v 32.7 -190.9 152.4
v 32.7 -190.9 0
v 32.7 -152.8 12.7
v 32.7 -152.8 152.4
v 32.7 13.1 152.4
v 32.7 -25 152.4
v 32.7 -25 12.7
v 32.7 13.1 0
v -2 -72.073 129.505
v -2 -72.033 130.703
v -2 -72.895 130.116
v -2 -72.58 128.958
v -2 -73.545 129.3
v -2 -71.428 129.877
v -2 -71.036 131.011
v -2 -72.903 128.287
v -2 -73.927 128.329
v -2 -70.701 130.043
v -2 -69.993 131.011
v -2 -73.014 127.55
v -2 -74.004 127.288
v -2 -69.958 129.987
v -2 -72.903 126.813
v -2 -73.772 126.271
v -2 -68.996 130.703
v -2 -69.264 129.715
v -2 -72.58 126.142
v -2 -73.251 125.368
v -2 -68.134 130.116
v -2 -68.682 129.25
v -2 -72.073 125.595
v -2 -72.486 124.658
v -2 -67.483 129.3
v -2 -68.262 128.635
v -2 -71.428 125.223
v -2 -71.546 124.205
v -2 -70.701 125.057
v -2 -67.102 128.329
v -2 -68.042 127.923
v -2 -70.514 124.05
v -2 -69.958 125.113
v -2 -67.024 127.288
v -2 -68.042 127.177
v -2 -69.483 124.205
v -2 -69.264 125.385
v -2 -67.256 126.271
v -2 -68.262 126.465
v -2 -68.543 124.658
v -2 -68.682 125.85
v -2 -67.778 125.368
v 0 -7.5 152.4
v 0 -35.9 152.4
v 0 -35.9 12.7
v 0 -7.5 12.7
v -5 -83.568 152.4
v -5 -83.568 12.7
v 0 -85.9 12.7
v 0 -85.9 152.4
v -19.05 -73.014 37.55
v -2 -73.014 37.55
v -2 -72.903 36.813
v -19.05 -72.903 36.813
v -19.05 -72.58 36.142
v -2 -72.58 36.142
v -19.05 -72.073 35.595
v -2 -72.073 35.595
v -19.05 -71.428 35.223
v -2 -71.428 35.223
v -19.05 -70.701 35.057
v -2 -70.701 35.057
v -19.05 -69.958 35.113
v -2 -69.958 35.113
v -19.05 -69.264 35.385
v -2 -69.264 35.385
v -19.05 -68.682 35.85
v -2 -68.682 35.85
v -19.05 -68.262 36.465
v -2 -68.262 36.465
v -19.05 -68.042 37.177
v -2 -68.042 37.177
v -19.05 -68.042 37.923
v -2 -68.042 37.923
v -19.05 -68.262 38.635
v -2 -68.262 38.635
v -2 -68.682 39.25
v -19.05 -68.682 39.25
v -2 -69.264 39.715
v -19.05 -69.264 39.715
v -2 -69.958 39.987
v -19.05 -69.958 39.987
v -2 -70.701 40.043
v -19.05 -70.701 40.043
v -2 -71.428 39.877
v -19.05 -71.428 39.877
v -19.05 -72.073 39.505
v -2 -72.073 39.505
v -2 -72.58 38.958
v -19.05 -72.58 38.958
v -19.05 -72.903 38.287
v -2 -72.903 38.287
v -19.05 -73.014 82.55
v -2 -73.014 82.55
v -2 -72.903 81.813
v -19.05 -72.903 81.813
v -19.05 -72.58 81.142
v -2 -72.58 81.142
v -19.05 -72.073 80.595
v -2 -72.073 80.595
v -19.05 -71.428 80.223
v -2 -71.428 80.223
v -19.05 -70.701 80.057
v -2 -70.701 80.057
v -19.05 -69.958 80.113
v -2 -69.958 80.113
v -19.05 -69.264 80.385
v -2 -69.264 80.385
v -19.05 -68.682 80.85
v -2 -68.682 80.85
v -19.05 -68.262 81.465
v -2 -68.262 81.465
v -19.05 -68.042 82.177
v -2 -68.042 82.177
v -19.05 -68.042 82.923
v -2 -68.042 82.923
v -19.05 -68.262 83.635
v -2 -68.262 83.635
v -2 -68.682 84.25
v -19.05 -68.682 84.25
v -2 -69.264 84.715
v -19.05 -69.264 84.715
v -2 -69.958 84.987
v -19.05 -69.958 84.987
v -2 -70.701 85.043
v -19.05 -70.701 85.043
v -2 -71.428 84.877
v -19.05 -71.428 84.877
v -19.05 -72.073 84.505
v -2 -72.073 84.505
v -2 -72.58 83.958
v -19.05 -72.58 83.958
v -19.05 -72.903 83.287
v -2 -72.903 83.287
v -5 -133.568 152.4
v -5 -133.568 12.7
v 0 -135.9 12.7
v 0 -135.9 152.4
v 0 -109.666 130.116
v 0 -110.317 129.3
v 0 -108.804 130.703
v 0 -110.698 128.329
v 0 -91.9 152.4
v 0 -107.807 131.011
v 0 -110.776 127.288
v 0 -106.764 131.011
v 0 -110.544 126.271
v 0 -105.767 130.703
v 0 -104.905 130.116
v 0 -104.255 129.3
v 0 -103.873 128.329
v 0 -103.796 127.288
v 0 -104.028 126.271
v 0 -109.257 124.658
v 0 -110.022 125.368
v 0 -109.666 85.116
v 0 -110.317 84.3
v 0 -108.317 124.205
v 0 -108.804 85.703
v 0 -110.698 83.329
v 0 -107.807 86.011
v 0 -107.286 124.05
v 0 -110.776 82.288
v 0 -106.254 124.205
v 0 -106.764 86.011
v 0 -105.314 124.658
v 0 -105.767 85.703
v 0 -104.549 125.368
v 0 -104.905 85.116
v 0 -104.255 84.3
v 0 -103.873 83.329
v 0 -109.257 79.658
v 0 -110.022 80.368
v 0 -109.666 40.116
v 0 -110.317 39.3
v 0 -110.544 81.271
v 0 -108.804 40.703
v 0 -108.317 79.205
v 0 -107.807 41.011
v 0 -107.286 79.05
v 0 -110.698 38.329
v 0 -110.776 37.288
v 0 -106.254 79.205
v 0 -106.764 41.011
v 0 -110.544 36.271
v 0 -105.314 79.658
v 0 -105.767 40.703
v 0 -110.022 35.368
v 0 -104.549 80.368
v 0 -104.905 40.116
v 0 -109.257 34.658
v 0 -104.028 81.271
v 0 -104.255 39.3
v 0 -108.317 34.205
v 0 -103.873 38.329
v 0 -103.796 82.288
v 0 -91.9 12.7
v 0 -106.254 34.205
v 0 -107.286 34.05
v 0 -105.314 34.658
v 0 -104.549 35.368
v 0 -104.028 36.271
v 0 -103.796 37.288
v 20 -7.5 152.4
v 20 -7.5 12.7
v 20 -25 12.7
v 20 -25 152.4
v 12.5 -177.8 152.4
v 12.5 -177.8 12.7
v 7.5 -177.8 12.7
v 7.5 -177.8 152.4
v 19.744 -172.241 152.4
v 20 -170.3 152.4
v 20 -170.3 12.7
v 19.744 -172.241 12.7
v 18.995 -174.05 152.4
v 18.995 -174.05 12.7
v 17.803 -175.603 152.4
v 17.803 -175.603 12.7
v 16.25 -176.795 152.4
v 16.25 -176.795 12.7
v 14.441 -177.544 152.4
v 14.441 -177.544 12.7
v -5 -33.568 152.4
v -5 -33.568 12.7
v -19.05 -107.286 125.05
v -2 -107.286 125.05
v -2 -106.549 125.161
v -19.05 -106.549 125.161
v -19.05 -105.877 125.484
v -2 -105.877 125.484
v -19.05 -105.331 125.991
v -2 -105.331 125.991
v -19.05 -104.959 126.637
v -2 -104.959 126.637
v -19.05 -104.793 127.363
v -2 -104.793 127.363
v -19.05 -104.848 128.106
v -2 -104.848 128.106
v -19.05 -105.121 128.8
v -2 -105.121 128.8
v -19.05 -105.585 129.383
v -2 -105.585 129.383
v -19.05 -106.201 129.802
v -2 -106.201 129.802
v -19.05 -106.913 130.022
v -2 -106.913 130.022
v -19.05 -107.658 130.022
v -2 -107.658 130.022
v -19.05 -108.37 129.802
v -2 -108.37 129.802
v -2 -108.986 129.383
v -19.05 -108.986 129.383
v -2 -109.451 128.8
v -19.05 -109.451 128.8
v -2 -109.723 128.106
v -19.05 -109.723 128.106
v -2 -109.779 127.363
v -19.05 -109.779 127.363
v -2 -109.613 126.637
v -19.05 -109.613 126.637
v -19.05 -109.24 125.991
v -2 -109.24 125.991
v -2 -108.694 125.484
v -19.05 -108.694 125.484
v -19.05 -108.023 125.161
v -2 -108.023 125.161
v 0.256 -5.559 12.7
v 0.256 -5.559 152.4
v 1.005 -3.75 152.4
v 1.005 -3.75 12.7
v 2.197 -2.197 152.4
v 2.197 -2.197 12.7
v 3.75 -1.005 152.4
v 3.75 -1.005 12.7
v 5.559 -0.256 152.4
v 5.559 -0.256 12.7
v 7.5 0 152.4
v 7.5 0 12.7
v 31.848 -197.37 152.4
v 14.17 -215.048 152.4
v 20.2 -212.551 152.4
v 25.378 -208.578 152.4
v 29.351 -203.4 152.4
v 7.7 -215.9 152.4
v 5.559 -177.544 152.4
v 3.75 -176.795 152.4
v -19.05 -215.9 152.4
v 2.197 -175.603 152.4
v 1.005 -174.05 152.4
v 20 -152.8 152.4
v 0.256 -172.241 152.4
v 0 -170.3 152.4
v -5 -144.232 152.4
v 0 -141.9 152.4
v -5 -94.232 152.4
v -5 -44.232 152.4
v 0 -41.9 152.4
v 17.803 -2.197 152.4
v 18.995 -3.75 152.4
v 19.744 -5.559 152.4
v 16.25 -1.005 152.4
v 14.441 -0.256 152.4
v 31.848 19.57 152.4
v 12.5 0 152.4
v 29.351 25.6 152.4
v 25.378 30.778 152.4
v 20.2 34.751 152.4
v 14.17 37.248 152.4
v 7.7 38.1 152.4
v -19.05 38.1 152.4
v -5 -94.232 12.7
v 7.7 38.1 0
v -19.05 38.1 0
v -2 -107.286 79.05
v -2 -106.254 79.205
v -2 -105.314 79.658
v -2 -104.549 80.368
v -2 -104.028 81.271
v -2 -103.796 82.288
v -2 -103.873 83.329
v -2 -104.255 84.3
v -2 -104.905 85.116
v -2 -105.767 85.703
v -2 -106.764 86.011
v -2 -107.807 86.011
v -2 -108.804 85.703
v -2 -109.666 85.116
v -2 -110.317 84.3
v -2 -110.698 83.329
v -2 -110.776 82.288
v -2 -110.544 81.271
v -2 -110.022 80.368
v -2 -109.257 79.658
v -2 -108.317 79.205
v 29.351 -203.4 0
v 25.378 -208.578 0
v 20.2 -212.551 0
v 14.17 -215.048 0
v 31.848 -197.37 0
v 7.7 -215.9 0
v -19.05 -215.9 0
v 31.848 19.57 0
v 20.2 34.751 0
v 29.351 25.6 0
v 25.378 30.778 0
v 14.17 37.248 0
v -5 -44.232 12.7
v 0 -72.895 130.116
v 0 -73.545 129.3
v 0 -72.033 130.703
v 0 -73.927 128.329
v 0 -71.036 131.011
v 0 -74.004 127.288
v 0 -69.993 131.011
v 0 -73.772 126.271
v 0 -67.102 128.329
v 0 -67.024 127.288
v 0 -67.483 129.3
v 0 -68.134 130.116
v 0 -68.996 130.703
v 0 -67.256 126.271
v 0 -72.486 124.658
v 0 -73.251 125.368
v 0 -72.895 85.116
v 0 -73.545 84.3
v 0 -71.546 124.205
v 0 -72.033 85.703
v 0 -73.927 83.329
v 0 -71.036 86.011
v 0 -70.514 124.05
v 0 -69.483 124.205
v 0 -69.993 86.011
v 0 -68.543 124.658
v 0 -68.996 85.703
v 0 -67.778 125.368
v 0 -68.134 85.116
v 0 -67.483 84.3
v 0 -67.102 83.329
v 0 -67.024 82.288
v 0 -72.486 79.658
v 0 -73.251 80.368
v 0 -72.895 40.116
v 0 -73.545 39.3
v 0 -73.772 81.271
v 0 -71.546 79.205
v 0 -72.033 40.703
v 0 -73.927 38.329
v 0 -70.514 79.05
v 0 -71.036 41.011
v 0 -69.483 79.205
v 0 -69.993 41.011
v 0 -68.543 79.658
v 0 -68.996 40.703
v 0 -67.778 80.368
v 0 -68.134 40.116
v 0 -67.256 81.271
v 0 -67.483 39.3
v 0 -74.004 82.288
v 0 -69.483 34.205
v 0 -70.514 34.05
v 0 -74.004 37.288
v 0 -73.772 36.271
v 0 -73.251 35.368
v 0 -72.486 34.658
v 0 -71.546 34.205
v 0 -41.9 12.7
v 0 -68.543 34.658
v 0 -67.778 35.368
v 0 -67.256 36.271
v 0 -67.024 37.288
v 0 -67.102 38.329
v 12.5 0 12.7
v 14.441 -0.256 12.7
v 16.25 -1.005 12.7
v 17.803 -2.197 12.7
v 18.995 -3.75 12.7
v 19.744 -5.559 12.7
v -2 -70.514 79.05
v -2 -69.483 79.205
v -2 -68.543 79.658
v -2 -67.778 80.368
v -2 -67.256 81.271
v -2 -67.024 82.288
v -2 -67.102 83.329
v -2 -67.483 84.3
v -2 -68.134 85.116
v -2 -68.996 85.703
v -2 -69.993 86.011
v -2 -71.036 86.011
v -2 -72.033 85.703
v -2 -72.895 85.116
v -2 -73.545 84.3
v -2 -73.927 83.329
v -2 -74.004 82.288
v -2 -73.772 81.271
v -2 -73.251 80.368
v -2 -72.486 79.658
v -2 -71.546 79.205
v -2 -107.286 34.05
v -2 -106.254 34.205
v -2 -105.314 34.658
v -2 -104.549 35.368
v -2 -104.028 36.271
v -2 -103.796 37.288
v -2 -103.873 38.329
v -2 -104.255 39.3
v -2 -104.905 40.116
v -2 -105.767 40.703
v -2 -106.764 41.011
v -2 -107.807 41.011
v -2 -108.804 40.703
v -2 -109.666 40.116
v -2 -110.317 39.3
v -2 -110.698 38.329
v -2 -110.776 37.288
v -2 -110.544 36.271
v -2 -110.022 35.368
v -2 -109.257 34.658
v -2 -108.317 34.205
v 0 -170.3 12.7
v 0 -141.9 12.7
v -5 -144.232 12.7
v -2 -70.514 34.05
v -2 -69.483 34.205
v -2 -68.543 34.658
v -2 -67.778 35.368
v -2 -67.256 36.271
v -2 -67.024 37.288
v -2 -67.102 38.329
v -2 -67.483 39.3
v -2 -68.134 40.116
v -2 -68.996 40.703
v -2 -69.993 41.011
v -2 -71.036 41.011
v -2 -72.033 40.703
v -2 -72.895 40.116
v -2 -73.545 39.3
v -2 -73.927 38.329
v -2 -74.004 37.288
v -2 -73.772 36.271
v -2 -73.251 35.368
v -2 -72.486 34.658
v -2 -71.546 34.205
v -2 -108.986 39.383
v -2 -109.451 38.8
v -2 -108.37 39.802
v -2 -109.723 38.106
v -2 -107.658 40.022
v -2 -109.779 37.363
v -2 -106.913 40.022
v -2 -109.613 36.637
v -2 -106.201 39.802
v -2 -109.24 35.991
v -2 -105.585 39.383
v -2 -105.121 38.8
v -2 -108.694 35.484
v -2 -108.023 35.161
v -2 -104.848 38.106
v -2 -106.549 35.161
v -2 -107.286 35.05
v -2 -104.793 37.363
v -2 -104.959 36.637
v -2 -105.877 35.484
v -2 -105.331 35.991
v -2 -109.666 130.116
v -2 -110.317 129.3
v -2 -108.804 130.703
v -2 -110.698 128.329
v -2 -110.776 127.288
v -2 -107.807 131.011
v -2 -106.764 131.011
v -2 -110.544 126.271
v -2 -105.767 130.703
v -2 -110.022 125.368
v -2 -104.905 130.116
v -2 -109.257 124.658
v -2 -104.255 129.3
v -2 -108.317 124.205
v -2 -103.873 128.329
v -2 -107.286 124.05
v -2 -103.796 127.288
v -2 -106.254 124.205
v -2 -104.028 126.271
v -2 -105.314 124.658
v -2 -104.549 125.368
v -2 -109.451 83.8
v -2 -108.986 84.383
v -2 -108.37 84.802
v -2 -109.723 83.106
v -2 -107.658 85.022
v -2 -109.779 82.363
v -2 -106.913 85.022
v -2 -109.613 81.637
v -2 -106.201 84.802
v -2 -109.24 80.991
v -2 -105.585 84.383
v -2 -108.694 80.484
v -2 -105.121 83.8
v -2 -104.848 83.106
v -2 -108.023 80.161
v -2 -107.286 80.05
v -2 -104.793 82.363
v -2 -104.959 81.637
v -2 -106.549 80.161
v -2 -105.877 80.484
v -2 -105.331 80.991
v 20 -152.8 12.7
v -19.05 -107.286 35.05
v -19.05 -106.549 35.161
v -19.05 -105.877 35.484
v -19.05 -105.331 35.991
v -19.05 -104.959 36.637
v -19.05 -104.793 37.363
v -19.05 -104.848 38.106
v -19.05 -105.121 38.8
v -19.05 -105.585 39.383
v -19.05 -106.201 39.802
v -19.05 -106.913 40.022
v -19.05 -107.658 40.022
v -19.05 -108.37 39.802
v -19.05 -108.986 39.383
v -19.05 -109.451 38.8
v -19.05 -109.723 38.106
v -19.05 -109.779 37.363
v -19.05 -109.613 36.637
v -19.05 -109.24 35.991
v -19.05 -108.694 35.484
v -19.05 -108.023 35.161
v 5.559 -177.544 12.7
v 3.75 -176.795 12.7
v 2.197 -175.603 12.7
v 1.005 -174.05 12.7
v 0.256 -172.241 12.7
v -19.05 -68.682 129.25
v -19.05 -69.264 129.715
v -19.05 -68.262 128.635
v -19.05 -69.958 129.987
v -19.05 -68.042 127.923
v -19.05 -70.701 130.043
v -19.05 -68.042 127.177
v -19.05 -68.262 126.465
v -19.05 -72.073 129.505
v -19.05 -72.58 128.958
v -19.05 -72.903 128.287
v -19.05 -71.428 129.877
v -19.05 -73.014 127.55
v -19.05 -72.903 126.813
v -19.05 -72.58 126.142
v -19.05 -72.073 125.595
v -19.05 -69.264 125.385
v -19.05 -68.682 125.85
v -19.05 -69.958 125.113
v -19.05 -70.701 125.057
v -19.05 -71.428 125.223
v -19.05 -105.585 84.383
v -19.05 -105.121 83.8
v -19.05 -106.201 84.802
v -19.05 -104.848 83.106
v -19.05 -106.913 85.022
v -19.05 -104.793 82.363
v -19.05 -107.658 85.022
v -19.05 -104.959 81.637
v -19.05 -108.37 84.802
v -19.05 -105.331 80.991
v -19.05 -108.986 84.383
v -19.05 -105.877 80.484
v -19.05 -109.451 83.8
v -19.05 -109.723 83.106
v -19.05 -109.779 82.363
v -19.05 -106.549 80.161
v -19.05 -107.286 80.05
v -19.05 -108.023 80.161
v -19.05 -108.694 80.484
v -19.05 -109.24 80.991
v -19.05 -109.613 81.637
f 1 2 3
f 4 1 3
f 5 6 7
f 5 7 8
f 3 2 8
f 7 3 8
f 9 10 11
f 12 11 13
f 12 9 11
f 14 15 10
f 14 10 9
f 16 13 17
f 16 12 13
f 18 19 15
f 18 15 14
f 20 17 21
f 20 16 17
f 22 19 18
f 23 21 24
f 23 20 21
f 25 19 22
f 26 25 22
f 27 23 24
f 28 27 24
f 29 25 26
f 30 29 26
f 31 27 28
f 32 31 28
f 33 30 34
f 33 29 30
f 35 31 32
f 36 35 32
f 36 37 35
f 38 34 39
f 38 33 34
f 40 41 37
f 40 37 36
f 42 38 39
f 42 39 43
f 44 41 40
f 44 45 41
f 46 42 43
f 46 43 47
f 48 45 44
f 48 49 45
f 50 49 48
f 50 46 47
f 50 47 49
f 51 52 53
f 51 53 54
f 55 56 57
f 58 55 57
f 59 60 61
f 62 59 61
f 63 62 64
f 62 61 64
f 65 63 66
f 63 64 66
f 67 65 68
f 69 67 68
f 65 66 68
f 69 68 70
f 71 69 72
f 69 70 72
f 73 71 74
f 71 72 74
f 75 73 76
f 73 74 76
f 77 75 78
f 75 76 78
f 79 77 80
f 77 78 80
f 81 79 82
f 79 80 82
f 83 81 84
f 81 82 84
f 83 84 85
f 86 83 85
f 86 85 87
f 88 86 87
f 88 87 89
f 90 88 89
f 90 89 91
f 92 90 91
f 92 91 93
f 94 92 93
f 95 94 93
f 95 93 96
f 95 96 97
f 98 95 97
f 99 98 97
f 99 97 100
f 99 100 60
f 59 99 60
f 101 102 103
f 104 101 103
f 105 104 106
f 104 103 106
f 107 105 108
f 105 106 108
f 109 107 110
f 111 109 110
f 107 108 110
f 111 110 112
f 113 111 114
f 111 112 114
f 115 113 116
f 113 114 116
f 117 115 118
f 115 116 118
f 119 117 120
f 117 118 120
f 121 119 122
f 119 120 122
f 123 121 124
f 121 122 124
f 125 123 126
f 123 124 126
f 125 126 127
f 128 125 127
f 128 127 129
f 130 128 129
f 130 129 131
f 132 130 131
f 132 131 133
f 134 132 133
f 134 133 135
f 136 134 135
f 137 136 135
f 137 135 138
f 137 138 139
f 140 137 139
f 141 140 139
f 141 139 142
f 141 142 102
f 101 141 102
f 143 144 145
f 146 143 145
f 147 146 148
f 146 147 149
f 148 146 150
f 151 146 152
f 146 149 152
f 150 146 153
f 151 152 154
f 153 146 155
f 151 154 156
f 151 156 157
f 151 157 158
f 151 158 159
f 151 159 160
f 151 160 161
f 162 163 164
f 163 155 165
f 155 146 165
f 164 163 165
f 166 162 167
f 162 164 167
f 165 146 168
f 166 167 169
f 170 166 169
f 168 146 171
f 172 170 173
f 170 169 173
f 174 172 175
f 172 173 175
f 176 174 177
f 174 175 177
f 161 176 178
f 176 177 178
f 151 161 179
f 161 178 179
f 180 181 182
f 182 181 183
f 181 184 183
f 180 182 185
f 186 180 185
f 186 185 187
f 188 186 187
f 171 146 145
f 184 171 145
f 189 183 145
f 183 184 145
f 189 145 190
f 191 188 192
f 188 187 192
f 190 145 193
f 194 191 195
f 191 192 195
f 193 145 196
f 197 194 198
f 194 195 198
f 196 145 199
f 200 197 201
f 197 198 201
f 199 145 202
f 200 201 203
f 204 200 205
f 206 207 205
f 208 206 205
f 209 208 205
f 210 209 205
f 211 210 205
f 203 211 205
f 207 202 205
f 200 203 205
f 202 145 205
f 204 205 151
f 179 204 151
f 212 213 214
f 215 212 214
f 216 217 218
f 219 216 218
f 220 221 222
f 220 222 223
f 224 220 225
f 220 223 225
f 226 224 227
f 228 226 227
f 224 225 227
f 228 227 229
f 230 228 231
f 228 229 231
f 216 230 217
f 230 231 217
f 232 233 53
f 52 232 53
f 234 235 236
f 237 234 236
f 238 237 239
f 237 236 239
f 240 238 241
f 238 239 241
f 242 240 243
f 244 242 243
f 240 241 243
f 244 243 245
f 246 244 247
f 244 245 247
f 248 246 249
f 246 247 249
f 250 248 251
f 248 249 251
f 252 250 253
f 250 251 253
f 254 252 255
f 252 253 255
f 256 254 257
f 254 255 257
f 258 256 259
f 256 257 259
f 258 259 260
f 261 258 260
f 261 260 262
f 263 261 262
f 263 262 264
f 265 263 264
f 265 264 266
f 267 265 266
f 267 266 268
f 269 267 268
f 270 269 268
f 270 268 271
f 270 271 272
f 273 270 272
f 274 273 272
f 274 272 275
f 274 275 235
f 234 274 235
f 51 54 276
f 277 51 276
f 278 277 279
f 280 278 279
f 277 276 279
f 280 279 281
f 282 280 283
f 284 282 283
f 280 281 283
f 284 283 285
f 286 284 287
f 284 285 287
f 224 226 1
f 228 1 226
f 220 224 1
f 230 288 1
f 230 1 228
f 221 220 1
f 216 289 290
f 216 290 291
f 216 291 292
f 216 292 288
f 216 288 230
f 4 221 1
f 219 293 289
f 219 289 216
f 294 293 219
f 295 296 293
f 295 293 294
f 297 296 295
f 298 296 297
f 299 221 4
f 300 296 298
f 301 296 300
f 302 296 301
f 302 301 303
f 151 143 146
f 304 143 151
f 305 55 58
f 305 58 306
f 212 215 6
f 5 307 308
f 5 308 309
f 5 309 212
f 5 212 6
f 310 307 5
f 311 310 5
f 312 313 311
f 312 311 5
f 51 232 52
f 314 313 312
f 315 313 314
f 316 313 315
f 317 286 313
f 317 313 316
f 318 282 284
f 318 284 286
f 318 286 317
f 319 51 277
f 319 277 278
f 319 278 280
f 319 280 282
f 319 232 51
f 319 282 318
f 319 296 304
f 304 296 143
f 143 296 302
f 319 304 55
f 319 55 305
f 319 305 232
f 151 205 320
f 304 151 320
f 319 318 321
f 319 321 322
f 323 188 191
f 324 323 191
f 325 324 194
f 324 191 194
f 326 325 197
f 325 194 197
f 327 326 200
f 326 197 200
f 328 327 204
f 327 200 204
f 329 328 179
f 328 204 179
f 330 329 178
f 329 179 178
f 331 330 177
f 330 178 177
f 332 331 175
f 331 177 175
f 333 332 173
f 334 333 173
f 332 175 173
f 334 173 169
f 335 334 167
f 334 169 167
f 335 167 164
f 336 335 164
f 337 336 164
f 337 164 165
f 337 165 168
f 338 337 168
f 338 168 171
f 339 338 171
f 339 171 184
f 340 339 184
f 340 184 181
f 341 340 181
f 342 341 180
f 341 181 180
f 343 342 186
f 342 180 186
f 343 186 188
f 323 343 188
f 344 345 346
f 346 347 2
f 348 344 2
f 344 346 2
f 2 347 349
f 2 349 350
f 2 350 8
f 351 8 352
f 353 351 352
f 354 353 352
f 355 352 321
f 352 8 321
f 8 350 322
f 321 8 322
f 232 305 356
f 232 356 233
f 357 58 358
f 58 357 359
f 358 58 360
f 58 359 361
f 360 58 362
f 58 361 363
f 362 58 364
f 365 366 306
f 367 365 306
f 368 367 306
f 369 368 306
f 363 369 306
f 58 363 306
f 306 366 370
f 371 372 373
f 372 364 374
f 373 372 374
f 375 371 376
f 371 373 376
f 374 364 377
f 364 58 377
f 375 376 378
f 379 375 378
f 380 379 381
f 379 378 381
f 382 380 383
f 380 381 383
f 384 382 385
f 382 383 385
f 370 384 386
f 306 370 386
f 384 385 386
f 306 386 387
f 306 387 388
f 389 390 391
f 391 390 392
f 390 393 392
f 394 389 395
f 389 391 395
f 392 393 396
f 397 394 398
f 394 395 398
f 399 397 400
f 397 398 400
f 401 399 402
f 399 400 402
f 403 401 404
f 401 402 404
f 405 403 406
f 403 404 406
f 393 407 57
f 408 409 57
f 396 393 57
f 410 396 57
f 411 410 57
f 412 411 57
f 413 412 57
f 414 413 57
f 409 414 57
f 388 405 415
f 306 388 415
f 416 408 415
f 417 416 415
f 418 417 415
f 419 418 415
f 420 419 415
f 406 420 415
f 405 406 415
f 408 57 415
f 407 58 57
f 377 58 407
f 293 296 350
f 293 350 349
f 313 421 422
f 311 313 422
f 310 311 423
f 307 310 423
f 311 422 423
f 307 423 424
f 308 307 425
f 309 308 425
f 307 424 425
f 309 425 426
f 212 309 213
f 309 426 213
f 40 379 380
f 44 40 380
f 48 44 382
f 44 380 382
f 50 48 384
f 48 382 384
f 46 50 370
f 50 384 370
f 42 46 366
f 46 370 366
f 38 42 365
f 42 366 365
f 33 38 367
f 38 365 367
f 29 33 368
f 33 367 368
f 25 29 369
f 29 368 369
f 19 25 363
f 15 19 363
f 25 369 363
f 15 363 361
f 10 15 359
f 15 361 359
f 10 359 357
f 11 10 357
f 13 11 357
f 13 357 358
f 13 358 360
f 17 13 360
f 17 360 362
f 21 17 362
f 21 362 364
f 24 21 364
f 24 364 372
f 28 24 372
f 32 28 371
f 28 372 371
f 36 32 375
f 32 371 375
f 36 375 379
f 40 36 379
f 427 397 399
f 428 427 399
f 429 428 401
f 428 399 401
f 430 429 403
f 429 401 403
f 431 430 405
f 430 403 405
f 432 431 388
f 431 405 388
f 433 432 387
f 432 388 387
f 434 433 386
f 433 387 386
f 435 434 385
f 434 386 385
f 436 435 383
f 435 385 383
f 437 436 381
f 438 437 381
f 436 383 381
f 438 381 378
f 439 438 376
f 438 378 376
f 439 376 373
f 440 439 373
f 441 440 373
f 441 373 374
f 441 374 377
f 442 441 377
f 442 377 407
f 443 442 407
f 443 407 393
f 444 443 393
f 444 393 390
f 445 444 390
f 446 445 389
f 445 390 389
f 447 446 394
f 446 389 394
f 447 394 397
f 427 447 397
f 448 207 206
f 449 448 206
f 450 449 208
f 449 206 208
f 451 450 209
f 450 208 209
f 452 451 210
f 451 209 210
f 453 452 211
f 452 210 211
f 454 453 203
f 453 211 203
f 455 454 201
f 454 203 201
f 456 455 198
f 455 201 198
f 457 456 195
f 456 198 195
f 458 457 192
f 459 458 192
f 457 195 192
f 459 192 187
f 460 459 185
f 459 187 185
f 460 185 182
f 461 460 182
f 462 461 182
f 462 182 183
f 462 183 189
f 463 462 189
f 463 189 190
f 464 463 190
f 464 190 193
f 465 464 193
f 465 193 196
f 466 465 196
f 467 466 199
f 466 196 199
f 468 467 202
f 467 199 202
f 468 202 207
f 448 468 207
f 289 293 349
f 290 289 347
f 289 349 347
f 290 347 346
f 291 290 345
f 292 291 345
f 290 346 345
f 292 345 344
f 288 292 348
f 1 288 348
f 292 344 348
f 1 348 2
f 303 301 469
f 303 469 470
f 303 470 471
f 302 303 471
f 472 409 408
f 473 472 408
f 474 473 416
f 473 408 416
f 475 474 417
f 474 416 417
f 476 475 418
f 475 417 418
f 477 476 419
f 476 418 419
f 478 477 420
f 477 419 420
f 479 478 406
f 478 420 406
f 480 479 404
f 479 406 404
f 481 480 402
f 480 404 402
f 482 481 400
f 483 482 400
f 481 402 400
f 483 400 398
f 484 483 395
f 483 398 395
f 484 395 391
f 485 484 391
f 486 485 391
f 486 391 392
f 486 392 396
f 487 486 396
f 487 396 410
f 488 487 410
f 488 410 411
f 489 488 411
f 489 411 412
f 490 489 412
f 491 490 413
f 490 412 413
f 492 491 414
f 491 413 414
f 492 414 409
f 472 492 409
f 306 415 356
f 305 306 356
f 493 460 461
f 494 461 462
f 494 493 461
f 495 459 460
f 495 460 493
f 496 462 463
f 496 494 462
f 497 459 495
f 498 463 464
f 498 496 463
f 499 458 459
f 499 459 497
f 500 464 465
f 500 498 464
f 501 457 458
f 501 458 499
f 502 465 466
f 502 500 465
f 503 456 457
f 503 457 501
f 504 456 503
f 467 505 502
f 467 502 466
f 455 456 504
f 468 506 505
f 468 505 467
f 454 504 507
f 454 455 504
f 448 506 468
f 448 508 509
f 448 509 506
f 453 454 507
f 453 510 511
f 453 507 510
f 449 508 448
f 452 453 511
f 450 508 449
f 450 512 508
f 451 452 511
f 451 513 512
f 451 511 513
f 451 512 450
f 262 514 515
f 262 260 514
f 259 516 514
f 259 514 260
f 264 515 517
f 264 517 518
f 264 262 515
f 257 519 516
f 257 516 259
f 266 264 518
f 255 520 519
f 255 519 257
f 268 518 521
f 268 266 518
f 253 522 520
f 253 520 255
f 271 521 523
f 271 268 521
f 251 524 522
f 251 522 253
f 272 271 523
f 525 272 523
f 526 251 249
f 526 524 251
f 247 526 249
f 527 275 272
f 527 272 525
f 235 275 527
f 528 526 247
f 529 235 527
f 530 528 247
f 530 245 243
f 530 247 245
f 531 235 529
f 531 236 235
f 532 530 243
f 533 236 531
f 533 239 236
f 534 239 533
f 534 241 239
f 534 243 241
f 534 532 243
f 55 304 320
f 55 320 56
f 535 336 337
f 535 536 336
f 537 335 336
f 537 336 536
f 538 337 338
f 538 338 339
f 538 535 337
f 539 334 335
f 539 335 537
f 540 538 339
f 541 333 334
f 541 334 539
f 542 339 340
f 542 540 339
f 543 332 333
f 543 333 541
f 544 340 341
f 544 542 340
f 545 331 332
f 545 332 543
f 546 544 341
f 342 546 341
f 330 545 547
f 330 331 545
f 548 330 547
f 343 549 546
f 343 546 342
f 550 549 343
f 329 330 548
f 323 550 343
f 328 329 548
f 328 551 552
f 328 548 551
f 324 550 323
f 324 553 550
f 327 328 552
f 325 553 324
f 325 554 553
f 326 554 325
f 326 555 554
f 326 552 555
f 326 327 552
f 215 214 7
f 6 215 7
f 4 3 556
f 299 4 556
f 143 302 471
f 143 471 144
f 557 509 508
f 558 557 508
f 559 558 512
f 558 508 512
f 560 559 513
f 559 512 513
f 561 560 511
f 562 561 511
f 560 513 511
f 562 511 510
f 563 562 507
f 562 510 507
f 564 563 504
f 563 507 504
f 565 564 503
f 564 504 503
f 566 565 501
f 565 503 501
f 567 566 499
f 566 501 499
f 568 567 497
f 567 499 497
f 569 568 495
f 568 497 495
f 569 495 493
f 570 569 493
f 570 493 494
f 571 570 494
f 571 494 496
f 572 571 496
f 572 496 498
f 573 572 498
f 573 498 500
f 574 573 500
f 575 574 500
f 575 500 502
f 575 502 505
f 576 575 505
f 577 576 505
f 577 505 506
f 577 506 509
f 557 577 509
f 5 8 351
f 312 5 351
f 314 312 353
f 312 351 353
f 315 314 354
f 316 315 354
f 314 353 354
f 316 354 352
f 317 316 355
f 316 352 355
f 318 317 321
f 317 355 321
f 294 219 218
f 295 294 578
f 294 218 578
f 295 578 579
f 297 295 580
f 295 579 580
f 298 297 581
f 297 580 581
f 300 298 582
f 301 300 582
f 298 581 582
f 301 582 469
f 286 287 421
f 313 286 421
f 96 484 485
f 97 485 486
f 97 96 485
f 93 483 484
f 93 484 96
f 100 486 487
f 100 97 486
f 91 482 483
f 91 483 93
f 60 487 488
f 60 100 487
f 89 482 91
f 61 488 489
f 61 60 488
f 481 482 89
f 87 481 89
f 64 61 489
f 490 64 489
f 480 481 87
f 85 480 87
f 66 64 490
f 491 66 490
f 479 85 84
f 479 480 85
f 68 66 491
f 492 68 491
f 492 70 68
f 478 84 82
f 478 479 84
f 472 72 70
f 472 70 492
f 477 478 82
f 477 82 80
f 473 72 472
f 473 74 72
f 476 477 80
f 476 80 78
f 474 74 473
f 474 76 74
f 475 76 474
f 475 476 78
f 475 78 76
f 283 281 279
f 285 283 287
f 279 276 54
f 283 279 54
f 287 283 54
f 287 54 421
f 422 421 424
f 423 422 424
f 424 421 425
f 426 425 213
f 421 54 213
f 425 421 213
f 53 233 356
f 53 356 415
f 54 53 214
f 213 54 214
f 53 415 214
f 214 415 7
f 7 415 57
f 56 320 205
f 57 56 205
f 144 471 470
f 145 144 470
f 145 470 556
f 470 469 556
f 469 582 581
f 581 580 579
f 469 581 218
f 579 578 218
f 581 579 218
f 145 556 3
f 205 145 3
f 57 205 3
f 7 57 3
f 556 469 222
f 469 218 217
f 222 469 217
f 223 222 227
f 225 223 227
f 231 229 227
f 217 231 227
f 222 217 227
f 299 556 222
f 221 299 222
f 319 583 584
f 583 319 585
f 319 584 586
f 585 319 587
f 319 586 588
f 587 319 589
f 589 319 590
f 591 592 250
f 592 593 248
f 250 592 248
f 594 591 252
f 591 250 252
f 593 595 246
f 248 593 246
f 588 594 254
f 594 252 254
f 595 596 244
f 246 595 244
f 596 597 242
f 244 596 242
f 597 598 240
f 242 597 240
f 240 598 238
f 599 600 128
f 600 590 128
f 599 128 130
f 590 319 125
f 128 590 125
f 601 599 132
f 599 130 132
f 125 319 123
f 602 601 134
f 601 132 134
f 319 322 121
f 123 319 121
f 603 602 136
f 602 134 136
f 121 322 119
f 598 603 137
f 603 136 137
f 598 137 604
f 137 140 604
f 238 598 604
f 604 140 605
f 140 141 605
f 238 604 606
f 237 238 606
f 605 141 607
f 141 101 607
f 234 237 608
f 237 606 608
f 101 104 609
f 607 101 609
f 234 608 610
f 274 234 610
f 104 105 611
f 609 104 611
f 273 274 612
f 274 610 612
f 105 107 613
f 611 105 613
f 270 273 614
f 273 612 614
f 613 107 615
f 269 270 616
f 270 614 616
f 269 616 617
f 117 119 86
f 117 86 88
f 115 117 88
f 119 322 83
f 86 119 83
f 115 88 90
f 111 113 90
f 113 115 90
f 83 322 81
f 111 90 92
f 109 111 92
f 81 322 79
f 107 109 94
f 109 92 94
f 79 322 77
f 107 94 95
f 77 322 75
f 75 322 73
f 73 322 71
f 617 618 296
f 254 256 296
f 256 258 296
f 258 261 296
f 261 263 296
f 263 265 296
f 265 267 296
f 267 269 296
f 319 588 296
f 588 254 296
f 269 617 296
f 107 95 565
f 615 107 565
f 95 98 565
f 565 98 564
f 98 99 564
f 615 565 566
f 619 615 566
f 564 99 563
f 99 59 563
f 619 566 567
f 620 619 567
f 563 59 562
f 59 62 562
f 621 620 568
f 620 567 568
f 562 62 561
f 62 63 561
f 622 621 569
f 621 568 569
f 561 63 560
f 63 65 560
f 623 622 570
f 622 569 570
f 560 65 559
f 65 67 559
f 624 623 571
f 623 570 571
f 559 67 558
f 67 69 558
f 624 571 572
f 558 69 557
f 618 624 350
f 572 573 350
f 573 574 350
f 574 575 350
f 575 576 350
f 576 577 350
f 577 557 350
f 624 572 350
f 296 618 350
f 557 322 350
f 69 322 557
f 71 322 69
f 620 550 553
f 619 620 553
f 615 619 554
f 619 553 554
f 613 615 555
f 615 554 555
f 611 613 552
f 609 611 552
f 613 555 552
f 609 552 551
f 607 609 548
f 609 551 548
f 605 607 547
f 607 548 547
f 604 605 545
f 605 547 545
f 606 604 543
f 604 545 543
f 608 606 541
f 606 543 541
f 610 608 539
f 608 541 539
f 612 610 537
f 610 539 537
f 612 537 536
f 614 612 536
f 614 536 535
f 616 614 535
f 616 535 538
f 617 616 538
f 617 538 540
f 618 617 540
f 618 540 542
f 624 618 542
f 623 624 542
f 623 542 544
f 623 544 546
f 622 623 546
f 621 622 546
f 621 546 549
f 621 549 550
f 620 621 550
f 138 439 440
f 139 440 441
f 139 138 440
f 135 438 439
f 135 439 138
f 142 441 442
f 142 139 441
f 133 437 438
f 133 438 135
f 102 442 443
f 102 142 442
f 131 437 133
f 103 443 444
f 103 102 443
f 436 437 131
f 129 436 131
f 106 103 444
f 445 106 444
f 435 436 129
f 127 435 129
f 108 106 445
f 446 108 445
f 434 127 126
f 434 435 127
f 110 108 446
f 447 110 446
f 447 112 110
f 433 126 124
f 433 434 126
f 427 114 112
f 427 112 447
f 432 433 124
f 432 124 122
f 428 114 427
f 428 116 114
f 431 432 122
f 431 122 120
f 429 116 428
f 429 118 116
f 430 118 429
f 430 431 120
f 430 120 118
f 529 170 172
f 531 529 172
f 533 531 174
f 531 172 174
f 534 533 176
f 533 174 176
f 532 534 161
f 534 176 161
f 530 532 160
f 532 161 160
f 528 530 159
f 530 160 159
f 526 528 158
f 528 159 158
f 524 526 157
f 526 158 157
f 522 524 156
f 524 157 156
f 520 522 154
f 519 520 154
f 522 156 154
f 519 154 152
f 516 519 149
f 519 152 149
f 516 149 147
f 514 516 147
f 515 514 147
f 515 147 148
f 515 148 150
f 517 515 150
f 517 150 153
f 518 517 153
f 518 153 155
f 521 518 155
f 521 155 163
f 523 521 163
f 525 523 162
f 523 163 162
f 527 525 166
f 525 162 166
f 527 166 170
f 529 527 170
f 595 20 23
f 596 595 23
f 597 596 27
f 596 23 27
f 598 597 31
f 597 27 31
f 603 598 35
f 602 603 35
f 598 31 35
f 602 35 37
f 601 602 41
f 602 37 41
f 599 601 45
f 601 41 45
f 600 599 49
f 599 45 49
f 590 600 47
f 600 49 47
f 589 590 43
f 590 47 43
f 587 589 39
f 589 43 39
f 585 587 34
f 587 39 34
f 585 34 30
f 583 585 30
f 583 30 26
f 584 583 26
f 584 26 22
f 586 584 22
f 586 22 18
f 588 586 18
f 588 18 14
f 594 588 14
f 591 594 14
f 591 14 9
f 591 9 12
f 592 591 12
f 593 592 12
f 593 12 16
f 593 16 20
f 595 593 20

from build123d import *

# Parameters (mm, degrees)
BOSS_EXTRUDE1_DEPTH = 152.4
BOSS_EXTRUDE2_DEPTH = 12.7
SKETCH3_R           = 2.5
CUT_EXTRUDE1_DEPTH  = 25
SKETCH4_R           = 3.5
CUT_EXTRUDE2_DEPTH  = 2


with BuildPart() as part:
    # Sketch1 → Boss-Extrude1 (new body)
    with BuildSketch(Plane(origin=(0, 0, 0), x_dir=(0, 1, 0), z_dir=(0, 0, 1))):
        with BuildLine():
            Line((-94.231538291, 5), (-88.9, 5))
            Line((-88.9, 5), (-88.9, 19.05))
            Line((-88.9, 19.05), (-215.9, 19.05))
            Line((-215.9, 19.05), (-215.9, -7.7))
            ThreePointArc((-215.9, -7.7), (-208.57766953, -25.37766953), (-190.9, -32.7))
            Line((-190.9, -32.7), (-152.8, -32.7))
            Line((-152.8, -32.7), (-152.8, -20))
            Line((-152.8, -20), (-170.3, -20))
            ThreePointArc((-170.3, -20), (-175.603300859, -17.803300859), (-177.8, -12.5))
            Line((-177.8, -12.5), (-177.8, -7.5))
            ThreePointArc((-177.8, -7.5), (-175.603300859, -2.196699141), (-170.3, 0))
            Line((-170.3, 0), (-141.9, 0))
            Line((-141.9, 0), (-144.231538291, 5))
            Line((-144.231538291, 5), (-133.568461709, 5))
            Line((-133.568461709, 5), (-135.9, 0))
            Line((-135.9, 0), (-91.9, 0))
            Line((-91.9, 0), (-94.231538291, 5))
        make_face()
        with BuildLine():
            Line((-35.9, 0), (-7.5, 0))
            ThreePointArc((-7.5, 0), (-2.196699141, -2.196699141), (0, -7.5))
            Line((0, -7.5), (0, -12.5))
            ThreePointArc((0, -12.5), (-2.196699141, -17.803300859), (-7.5, -20))
            Line((-7.5, -20), (-25, -20))
            Line((-25, -20), (-25, -32.7))
            Line((-25, -32.7), (13.1, -32.7))
            ThreePointArc((13.1, -32.7), (30.77766953, -25.37766953), (38.1, -7.7))
            Line((38.1, -7.7), (38.1, 19.05))
            Line((38.1, 19.05), (-88.9, 19.05))
            Line((-88.9, 19.05), (-88.9, 5))
            Line((-88.9, 5), (-83.568461709, 5))
            Line((-83.568461709, 5), (-85.9, 0))
            Line((-85.9, 0), (-41.9, 0))
            Line((-41.9, 0), (-44.231538291, 5))
            Line((-44.231538291, 5), (-33.568461709, 5))
            Line((-33.568461709, 5), (-35.9, 0))
        make_face()
    extrude(amount=BOSS_EXTRUDE1_DEPTH)

    # Sketch2 → Boss-Extrude2 (add)
    with BuildSketch(Plane(origin=(0, 0, 0), x_dir=(1, 0, 0), z_dir=(0, 0, -1))):
        Polygon((-19.05, 215.9), (-19.05, -38.1), (7.7, -38.1), (32.7, 25), (32.7, 152.8), (32.7, 190.9), (7.7, 215.9), align=None)
    extrude(amount=-BOSS_EXTRUDE2_DEPTH)

    # Sketch3 → Cut-Extrude1 (cut)
    with BuildSketch(Plane.YZ):
        with Locations(Location((-107.285735893, 82.55, 0), (0, 0, 270))):
            Circle(SKETCH3_R)
        with Locations(Location((-107.285735893, 127.55, 0), (0, 0, 270))):
            Circle(SKETCH3_R)
        with Locations(Location((-107.285735893, 37.55, 0), (0, 0, 270))):
            Circle(SKETCH3_R)
        with Locations(Location((-70.514264107, 37.55, 0), (0, 0, 180))):
            Circle(SKETCH3_R)
        with Locations(Location((-70.514264107, 82.55, 0), (0, 0, 180))):
            Circle(SKETCH3_R)
        with Locations(Location((-70.514264107, 127.55, 0), (0, 0, 180))):
            Circle(SKETCH3_R)
    extrude(amount=-CUT_EXTRUDE1_DEPTH, mode=Mode.SUBTRACT)

    # Sketch4 → Cut-Extrude2 (cut)
    with BuildSketch(Plane.YZ):
        with Locations(Location((-107.285735893, 127.55, 0), (0, 0, 270))):
            Circle(SKETCH4_R)
        with Locations(Location((-107.285735893, 82.55, 0), (0, 0, 270))):
            Circle(SKETCH4_R)
        with Locations(Location((-107.285735893, 37.55, 0), (0, 0, 270))):
            Circle(SKETCH4_R)
        with Locations(Location((-70.514264107, 37.55, 0), (0, 0, 270))):
            Circle(SKETCH4_R)
        with Locations(Location((-70.514264107, 82.55, 0), (0, 0, 270))):
            Circle(SKETCH4_R)
        with Locations(Location((-70.514264107, 127.55, 0), (0, 0, 270))):
            Circle(SKETCH4_R)
    extrude(amount=-CUT_EXTRUDE2_DEPTH, mode=Mode.SUBTRACT)


solid = part.part
